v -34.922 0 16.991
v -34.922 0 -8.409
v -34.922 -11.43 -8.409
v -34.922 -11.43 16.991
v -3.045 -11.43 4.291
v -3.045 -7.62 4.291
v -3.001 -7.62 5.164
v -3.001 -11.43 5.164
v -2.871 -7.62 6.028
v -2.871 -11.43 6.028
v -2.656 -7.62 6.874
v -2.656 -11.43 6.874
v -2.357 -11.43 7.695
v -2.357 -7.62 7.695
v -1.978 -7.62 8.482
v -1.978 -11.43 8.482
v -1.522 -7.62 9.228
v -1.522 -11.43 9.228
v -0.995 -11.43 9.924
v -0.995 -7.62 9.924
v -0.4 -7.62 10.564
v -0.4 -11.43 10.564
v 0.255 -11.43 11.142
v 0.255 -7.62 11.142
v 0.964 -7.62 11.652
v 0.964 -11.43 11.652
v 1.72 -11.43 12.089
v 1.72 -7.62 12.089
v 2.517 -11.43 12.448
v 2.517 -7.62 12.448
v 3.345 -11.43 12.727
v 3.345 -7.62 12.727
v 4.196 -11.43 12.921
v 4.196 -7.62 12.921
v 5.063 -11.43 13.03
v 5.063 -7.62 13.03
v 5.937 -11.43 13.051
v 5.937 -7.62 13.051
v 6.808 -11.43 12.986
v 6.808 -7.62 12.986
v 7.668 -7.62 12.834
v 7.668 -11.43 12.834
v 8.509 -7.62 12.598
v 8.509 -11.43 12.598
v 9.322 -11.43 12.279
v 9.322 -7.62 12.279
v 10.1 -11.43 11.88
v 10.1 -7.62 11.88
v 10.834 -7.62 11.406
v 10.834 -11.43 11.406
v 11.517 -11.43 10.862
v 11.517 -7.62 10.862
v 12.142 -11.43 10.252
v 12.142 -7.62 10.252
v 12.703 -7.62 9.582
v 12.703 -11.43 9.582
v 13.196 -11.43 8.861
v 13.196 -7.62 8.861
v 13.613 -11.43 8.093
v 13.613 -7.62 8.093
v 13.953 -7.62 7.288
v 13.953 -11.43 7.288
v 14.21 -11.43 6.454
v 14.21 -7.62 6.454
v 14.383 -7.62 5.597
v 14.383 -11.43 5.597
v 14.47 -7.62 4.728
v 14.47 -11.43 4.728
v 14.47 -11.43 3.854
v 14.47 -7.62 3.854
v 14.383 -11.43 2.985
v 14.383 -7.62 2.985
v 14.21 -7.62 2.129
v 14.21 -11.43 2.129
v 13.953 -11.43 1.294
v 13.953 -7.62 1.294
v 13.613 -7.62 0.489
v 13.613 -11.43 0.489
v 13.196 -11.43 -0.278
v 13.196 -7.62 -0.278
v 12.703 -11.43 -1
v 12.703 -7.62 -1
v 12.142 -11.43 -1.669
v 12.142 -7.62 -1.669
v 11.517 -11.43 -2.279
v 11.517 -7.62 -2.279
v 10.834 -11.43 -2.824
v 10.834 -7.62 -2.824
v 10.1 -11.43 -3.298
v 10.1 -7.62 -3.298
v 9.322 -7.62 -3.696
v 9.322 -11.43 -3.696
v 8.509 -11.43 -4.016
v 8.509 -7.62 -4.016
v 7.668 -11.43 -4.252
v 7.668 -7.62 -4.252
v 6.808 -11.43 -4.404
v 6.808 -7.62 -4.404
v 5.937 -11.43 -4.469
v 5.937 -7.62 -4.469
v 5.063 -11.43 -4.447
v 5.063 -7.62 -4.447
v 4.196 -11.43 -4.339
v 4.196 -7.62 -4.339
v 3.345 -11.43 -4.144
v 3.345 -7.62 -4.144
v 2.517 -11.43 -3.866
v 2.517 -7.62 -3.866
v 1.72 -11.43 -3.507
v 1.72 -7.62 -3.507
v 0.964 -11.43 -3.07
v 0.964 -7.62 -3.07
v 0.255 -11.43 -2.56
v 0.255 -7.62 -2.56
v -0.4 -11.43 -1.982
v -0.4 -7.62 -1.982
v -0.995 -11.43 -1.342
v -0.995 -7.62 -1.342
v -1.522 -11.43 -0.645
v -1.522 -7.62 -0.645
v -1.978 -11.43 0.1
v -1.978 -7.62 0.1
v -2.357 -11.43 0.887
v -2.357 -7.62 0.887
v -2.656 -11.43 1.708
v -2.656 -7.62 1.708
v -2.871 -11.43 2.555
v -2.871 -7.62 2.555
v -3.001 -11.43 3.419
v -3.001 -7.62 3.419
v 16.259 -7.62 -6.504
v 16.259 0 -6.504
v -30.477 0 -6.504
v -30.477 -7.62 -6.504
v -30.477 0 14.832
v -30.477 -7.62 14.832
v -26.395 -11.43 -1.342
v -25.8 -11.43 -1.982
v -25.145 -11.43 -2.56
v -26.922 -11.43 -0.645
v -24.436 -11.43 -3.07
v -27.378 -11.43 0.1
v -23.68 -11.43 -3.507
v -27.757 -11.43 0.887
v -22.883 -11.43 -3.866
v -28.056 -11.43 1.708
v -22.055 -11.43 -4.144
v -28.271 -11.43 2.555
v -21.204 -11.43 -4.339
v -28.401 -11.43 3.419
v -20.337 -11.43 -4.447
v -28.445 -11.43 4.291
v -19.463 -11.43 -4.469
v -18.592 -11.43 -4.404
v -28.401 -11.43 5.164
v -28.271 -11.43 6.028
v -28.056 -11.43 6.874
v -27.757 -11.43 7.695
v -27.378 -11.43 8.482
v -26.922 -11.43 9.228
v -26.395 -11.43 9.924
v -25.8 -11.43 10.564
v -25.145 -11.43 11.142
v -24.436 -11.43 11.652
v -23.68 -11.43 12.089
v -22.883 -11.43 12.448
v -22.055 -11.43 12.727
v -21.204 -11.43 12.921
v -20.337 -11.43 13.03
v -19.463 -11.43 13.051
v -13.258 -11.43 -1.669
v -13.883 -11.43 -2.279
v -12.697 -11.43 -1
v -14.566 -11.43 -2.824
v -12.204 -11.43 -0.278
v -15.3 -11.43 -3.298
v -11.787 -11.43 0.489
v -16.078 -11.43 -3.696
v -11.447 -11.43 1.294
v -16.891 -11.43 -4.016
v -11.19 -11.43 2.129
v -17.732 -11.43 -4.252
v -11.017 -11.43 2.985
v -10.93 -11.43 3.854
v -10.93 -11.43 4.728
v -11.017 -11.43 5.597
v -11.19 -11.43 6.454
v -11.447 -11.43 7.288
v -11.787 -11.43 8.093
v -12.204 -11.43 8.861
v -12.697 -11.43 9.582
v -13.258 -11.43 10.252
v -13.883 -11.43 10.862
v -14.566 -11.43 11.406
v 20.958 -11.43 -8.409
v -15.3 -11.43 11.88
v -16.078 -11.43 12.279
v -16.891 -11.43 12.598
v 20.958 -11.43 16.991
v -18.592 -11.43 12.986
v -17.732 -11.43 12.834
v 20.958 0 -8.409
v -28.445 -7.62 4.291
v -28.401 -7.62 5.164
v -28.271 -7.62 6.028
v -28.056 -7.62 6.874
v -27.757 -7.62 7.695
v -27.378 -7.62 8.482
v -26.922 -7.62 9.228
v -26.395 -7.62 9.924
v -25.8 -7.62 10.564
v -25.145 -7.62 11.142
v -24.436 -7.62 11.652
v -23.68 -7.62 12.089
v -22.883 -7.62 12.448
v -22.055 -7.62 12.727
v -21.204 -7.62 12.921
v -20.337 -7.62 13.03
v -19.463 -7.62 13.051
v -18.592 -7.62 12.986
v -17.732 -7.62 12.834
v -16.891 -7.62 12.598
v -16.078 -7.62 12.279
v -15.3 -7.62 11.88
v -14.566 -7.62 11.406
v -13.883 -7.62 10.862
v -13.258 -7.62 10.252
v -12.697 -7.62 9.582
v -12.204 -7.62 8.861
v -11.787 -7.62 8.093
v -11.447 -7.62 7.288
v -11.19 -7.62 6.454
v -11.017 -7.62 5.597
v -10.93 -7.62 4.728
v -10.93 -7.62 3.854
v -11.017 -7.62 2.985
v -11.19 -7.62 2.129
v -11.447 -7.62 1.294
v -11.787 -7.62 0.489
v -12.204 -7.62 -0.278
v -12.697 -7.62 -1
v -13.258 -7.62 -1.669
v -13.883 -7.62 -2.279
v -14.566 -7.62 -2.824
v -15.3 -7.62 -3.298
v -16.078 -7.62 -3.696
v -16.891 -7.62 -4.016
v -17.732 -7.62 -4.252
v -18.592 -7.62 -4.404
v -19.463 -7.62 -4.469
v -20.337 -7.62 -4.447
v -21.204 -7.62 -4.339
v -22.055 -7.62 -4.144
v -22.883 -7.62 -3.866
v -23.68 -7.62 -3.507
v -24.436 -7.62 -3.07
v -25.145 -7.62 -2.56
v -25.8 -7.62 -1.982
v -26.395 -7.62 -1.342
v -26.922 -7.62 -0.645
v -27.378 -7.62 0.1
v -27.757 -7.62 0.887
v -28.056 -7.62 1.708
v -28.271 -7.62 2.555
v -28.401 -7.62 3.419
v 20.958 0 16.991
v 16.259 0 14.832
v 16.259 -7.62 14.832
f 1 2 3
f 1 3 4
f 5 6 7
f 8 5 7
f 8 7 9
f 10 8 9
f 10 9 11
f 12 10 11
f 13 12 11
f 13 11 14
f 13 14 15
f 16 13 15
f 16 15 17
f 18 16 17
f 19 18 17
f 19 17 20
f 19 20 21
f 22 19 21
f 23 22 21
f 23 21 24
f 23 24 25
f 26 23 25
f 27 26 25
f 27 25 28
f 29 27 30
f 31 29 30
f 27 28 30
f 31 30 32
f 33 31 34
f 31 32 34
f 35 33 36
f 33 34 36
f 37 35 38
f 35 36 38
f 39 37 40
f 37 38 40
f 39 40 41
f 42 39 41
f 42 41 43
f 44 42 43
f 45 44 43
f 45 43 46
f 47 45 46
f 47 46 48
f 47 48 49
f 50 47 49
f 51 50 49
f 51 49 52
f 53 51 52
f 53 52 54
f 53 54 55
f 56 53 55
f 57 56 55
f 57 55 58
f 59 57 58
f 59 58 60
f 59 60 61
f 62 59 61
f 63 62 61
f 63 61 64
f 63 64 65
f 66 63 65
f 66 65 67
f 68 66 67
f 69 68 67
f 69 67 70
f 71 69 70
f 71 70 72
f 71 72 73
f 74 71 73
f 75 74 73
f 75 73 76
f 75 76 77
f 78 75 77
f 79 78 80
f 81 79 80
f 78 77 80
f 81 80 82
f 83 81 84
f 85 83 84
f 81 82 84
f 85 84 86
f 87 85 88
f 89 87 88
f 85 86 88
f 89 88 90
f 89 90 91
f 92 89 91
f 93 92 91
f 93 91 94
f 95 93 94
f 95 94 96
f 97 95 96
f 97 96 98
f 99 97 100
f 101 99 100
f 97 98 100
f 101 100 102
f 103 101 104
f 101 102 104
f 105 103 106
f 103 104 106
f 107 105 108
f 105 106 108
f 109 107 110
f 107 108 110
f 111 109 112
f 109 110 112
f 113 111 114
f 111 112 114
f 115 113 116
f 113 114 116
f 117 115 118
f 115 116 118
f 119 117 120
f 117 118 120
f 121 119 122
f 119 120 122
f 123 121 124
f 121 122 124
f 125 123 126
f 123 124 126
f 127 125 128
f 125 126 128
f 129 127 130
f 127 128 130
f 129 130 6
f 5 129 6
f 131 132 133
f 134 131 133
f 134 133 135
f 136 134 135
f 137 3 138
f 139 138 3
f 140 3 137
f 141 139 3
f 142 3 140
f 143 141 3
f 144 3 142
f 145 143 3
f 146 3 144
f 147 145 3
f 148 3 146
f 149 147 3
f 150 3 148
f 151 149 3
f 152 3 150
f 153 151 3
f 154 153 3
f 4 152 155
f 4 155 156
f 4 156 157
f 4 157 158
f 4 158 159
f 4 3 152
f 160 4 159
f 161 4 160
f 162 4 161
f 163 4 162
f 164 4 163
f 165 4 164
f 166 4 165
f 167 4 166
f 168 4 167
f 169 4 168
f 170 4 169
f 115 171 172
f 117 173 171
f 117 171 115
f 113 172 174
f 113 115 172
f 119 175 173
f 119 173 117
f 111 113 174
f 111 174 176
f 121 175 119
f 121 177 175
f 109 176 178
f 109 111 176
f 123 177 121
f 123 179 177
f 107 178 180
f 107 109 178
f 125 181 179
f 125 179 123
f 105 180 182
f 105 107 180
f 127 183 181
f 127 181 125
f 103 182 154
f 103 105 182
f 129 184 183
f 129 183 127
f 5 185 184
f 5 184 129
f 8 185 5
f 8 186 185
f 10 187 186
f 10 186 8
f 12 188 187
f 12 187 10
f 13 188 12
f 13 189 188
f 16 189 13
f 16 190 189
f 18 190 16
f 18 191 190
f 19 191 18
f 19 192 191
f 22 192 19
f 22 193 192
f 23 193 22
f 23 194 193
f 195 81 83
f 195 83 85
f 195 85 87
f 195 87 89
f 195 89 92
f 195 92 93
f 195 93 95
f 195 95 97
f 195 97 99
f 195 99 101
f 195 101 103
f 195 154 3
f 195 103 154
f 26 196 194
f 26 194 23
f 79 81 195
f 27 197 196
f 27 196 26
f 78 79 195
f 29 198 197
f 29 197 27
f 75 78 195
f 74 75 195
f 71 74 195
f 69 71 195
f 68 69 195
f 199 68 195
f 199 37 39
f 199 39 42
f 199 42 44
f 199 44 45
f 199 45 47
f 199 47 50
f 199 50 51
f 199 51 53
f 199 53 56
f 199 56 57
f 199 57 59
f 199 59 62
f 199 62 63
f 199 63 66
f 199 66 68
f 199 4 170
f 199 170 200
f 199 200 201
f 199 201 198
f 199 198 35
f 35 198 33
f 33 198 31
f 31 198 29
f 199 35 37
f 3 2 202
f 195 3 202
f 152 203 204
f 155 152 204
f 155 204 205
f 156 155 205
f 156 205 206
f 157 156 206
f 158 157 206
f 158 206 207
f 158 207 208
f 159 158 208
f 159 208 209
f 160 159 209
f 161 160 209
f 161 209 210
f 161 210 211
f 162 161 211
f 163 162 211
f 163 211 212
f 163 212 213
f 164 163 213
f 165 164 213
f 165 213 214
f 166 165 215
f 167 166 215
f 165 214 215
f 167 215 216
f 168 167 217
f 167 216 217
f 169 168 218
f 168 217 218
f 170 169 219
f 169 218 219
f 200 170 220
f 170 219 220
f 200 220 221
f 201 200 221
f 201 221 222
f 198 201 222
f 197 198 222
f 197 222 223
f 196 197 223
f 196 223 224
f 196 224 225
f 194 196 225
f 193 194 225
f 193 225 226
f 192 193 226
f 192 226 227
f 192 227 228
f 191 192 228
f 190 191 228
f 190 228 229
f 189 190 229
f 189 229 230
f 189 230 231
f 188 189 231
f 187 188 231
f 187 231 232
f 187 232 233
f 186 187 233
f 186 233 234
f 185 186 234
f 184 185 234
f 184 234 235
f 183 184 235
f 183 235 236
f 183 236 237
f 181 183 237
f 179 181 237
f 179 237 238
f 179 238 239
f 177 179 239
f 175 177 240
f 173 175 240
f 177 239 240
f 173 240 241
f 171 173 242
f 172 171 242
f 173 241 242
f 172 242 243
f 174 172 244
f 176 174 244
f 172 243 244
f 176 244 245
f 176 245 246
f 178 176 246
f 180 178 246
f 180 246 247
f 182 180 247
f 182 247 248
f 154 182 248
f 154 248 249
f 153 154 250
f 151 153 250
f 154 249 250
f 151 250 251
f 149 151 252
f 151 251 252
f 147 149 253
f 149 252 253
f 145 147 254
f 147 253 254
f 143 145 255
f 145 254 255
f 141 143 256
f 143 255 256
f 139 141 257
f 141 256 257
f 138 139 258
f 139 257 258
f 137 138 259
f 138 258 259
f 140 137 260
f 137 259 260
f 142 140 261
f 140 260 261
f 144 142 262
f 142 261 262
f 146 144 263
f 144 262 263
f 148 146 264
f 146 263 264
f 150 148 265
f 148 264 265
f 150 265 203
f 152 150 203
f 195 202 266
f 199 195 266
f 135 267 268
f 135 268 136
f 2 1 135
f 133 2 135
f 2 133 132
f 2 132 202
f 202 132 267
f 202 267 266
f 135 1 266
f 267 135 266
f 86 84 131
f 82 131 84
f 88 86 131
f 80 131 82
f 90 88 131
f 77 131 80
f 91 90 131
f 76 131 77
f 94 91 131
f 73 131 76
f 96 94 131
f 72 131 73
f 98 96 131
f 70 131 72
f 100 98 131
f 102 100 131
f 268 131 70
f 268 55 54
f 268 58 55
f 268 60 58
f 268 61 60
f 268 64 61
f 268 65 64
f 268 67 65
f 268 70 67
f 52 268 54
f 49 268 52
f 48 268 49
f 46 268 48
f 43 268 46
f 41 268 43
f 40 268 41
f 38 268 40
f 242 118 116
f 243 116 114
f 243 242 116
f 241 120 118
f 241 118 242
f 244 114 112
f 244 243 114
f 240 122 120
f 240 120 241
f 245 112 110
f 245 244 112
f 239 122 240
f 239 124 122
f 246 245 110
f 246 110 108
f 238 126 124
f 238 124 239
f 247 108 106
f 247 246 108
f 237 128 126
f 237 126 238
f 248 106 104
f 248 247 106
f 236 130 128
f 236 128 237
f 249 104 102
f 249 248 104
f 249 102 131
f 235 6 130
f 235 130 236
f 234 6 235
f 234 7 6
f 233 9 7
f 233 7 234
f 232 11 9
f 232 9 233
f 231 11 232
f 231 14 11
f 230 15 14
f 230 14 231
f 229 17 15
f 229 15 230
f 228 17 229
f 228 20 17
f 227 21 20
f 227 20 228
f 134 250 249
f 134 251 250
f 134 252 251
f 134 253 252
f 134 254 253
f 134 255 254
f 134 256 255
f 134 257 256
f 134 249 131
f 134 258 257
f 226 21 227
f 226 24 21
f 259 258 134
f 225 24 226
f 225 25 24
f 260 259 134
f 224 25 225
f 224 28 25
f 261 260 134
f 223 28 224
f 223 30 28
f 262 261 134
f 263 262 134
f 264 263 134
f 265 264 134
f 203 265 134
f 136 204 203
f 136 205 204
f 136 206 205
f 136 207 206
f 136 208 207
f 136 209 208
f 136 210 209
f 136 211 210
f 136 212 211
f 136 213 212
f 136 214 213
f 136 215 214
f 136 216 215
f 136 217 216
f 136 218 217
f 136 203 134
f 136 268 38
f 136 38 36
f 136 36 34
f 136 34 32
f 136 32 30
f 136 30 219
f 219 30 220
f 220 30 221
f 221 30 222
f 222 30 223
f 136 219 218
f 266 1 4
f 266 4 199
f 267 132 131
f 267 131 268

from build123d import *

# Parameters (mm, degrees)
F0_W     = 55.88
F0_H     = 25.4
F1_DEPTH = 11.43
F2_R     = 8.763
F3_DEPTH = 25.4
F4_W     = 46.736
F4_H     = 21.336
F4_R     = 8.763
F5_DEPTH = 7.62


with BuildPart() as f1:
    # F0 (on Front) → F1 (new body)
    with BuildSketch(Plane.XZ):
        with Locations((-6.981825, 4.291174)):
            Rectangle(F0_W, F0_H)
    extrude(amount=F1_DEPTH)

    # F2 (on face) → F3 (cut)
    with BuildSketch(Plane(origin=(0, 0, 0), x_dir=(-1, 0, 0), z_dir=(0, 1, 0))):
        with Locations((19.681825, 4.291174)):
            Circle(F2_R)
        with Locations((-5.718175, 4.291174)):
            Circle(F2_R)
    extrude(amount=-F3_DEPTH, mode=Mode.SUBTRACT)

    # F4 (on face) → F5 (cut)
    with BuildSketch(Plane(origin=(0, 0, 0), x_dir=(-1, 0, 0), z_dir=(0, 1, 0))):
        with Locations((7.108825, 4.164174)):
            Rectangle(F4_W, F4_H)
        with Locations((-5.718175, 4.291174)):
            Circle(F4_R, mode=Mode.SUBTRACT)
        with Locations((19.681825, 4.291174)):
            Circle(F4_R, mode=Mode.SUBTRACT)
    extrude(amount=-F5_DEPTH, mode=Mode.SUBTRACT)


solid = f1.part
